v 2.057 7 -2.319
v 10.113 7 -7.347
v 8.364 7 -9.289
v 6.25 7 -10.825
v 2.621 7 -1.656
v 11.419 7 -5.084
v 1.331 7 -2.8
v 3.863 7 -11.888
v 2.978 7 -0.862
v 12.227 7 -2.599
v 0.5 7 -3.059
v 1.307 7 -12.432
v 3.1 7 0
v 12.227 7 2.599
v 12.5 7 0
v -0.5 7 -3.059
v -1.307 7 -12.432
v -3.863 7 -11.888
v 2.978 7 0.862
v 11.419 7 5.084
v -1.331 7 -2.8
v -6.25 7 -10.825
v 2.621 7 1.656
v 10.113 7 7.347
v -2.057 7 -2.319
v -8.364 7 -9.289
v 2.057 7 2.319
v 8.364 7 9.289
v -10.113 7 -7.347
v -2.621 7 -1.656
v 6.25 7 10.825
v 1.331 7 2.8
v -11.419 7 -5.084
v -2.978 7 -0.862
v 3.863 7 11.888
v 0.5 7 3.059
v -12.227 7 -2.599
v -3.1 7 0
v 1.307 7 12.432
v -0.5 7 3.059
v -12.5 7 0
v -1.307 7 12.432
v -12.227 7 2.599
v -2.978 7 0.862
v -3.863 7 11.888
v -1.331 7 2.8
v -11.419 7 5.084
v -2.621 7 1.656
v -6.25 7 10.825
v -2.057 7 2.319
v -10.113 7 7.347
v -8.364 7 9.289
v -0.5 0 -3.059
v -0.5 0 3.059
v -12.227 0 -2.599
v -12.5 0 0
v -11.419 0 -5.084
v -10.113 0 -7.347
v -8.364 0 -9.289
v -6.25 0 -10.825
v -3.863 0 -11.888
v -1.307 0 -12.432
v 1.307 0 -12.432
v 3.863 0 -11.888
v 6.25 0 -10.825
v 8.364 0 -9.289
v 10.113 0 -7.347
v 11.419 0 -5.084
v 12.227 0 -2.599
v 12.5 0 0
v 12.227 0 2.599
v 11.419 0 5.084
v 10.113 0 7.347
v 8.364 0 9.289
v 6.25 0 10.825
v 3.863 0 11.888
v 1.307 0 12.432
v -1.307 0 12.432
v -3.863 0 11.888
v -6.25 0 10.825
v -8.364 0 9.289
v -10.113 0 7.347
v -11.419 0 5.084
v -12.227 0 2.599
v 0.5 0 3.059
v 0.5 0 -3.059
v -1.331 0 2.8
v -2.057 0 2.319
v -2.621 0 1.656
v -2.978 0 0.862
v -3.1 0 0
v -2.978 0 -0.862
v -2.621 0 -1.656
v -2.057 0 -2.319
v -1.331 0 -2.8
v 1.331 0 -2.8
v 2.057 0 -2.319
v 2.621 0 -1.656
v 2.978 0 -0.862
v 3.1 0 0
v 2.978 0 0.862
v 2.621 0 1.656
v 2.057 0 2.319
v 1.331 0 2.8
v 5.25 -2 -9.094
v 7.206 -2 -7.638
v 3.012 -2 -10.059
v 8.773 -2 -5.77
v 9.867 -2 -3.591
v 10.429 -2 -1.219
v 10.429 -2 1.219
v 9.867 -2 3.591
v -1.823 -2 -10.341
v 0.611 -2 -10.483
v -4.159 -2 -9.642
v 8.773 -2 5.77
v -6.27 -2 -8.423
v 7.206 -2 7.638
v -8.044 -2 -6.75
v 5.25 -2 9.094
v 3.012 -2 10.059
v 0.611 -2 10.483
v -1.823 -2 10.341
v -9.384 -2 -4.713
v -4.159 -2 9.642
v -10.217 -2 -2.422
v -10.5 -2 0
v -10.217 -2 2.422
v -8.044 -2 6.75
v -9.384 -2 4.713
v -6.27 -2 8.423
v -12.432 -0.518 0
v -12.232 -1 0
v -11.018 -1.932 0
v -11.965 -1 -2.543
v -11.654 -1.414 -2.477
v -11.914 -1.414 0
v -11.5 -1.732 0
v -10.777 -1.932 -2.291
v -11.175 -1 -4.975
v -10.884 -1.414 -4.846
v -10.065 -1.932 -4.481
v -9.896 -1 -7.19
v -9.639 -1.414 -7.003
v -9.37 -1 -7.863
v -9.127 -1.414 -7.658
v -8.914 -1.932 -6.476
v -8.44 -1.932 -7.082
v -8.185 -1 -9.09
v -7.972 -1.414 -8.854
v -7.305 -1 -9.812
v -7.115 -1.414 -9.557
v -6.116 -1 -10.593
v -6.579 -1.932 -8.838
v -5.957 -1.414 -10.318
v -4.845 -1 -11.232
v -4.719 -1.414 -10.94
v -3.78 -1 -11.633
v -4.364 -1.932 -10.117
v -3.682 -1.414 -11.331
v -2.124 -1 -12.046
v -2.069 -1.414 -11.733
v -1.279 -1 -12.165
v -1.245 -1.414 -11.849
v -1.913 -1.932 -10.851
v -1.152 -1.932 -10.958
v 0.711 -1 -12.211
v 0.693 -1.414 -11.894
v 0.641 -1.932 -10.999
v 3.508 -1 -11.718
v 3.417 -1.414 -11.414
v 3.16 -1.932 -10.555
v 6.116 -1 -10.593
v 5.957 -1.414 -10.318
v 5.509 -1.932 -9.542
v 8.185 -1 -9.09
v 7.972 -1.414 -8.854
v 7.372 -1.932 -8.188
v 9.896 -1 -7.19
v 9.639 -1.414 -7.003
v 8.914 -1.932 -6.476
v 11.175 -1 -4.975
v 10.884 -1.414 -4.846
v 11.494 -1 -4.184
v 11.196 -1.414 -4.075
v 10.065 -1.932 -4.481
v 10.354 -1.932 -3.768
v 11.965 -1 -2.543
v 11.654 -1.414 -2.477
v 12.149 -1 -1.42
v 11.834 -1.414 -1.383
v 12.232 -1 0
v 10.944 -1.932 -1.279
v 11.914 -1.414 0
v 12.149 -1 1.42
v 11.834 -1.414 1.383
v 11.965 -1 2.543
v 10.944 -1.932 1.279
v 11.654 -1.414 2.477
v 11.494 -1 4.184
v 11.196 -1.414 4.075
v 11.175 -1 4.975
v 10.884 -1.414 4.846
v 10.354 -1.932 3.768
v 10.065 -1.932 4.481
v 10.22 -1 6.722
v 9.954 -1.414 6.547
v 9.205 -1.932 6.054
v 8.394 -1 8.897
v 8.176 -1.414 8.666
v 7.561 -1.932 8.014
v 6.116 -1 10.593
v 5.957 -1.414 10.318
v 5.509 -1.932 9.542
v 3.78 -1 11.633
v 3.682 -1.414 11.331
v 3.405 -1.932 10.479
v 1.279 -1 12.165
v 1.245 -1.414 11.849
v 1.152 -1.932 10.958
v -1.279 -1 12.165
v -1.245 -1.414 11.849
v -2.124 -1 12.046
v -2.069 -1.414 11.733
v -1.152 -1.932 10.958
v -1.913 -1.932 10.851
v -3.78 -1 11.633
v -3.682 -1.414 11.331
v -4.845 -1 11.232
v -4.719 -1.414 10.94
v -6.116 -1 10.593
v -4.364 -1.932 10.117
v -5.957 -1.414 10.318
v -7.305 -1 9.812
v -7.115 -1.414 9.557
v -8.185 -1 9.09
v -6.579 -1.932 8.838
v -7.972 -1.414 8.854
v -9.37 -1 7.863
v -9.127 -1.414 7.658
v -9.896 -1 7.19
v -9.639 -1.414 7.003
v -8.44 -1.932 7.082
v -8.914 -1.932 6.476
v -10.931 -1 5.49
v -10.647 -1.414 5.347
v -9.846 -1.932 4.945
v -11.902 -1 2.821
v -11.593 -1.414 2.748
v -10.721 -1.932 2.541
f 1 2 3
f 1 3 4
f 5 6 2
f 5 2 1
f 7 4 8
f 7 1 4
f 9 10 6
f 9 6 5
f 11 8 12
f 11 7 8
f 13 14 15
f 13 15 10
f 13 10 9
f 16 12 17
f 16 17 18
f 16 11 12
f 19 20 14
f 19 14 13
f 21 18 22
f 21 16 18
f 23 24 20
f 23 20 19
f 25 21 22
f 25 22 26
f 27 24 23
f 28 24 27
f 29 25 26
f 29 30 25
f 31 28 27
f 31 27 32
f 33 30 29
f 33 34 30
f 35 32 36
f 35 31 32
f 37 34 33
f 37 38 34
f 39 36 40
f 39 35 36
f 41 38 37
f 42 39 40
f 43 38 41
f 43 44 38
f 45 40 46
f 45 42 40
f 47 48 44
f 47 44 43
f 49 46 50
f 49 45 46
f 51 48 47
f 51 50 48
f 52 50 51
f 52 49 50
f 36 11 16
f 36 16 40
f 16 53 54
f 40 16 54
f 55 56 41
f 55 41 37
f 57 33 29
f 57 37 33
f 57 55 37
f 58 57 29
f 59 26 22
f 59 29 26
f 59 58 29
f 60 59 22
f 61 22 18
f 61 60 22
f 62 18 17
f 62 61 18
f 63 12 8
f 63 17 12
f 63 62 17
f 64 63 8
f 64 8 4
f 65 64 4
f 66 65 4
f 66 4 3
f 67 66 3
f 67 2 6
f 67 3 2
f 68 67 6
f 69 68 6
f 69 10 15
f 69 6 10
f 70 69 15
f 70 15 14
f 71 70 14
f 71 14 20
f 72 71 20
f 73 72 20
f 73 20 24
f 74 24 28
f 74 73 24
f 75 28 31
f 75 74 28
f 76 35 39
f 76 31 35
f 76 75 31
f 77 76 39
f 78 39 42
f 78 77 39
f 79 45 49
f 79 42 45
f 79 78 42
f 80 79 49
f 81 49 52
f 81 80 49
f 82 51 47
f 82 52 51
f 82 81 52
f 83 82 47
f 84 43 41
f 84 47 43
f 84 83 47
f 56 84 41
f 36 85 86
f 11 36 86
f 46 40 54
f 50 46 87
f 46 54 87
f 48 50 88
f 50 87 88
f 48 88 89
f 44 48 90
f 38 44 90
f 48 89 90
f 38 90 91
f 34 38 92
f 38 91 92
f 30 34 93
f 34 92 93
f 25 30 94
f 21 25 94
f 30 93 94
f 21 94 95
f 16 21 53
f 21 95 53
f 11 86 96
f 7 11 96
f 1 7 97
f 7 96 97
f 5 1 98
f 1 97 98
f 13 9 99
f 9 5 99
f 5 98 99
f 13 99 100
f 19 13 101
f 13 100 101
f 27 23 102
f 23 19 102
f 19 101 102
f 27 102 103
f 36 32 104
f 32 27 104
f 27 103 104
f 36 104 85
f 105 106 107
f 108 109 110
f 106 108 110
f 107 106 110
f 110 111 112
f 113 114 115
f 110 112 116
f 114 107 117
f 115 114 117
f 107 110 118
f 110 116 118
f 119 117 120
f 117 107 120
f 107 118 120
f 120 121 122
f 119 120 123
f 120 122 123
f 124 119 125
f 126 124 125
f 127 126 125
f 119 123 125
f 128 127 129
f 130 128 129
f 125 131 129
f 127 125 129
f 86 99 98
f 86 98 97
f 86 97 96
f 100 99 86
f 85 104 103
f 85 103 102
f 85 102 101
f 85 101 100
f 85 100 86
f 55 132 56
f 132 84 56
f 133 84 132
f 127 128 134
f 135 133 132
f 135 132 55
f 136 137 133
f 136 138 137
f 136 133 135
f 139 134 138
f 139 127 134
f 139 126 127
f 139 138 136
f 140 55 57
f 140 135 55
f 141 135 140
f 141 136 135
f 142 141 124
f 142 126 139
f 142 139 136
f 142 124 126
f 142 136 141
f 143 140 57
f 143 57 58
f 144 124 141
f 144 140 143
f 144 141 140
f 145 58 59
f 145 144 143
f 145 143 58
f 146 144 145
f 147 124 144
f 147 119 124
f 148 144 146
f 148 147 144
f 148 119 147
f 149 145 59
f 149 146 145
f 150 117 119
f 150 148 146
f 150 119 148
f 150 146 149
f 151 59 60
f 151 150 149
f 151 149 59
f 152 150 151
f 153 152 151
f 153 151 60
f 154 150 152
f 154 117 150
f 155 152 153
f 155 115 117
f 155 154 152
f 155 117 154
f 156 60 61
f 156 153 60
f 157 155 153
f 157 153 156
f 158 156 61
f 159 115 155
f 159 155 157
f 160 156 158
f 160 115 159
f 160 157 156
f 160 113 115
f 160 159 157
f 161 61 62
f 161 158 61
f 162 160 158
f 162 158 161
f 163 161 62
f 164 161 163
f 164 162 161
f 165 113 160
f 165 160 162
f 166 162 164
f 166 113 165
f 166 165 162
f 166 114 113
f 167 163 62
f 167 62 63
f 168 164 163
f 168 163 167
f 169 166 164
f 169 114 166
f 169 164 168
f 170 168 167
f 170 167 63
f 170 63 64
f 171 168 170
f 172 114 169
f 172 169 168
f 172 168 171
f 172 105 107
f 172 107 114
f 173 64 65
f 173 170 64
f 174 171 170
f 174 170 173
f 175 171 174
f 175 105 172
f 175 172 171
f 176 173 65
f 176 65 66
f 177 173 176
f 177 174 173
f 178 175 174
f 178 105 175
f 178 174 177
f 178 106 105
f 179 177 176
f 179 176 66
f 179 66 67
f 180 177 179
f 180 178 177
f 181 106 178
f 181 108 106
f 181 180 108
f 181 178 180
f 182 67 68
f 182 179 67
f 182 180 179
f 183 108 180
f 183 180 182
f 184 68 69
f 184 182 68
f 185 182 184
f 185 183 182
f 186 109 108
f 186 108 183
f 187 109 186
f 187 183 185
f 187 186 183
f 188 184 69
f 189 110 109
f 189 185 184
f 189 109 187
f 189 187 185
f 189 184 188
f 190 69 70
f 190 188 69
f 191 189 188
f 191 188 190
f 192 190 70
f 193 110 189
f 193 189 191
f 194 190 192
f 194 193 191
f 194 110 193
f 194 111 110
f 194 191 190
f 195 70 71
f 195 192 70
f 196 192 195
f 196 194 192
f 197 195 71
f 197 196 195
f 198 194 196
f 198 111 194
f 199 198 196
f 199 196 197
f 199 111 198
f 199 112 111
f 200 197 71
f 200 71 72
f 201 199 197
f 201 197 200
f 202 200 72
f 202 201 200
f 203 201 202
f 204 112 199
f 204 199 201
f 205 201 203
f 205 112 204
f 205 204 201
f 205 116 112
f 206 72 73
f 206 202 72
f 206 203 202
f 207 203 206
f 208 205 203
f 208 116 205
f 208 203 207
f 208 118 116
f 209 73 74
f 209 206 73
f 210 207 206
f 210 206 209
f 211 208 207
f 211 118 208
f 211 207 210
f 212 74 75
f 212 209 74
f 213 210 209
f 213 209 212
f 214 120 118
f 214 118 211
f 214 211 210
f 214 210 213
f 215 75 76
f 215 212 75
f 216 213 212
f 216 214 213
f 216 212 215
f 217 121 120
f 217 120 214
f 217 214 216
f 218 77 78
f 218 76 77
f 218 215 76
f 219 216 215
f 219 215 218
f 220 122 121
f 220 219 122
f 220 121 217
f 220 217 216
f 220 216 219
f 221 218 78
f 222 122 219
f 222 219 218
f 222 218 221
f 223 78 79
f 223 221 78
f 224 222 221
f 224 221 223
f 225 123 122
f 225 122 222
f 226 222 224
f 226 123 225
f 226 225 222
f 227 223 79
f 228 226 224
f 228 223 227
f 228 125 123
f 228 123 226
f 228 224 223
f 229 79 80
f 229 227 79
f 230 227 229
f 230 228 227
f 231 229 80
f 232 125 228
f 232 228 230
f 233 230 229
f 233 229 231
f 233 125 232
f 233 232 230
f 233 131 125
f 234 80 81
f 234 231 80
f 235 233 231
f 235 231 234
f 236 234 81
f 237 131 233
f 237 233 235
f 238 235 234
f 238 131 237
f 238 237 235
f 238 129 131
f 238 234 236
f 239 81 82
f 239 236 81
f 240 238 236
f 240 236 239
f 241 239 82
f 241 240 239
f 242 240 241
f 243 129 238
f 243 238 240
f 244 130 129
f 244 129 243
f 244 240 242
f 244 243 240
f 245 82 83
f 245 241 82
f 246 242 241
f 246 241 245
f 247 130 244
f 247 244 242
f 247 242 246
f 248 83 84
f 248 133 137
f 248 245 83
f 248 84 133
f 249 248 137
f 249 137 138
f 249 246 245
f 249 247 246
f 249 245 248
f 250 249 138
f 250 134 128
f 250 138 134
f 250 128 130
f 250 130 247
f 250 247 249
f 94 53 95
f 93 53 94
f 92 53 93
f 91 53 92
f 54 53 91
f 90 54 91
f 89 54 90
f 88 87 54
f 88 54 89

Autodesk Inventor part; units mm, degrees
ref_plane "YZ Plane" through (0, 0, 0) normal (1, 0, 0) x (0, 1, 0)
ref_plane "XZ Plane" through (0, 0, 0) normal (0, 1, 0) x (-1, 0, 0)
ref_plane "XY Plane" through (0, 0, 0) normal (0, 0, 1) x (1, 0, 0)
sketch "Sketch1" plane through (0, 0, 0) normal (0, 1, 0) x (-1, 0, 0)
  circle A0 centre (0, 0) radius 12.5
  circle A1 centre (0, 0) radius 3.1
  line L0 (-0.5, 3.0594) -> (-0.5, -3.0594)
  line L1 (0.5, -3.0594) -> (0.5, 3.0594)
  line L2 (0.5, 3.0594) -> (-0.5, -3.0594) construction
  line L3 (-0.5, 3.0594) -> (0.5, -3.0594) construction
  dimension "d0" = 6.2
  dimension "d1" = 25
  dimension "d3" = 1
extrude "Extrusion1" add sketch "Sketch1" along normal blind 7
extrude "Extrusion2" add sketch "Sketch1" along normal blind 7 contours L1 A1 L0
extrude "Extrusion3" add sketch "Sketch1" against normal blind 2 contours A0 | A1 L1 | L1 A1 L0 | L0 A1
fillet "Fillet1" radius 2 1 edges at (12.5, -2, 0)
properties part number "volumeKnob"
